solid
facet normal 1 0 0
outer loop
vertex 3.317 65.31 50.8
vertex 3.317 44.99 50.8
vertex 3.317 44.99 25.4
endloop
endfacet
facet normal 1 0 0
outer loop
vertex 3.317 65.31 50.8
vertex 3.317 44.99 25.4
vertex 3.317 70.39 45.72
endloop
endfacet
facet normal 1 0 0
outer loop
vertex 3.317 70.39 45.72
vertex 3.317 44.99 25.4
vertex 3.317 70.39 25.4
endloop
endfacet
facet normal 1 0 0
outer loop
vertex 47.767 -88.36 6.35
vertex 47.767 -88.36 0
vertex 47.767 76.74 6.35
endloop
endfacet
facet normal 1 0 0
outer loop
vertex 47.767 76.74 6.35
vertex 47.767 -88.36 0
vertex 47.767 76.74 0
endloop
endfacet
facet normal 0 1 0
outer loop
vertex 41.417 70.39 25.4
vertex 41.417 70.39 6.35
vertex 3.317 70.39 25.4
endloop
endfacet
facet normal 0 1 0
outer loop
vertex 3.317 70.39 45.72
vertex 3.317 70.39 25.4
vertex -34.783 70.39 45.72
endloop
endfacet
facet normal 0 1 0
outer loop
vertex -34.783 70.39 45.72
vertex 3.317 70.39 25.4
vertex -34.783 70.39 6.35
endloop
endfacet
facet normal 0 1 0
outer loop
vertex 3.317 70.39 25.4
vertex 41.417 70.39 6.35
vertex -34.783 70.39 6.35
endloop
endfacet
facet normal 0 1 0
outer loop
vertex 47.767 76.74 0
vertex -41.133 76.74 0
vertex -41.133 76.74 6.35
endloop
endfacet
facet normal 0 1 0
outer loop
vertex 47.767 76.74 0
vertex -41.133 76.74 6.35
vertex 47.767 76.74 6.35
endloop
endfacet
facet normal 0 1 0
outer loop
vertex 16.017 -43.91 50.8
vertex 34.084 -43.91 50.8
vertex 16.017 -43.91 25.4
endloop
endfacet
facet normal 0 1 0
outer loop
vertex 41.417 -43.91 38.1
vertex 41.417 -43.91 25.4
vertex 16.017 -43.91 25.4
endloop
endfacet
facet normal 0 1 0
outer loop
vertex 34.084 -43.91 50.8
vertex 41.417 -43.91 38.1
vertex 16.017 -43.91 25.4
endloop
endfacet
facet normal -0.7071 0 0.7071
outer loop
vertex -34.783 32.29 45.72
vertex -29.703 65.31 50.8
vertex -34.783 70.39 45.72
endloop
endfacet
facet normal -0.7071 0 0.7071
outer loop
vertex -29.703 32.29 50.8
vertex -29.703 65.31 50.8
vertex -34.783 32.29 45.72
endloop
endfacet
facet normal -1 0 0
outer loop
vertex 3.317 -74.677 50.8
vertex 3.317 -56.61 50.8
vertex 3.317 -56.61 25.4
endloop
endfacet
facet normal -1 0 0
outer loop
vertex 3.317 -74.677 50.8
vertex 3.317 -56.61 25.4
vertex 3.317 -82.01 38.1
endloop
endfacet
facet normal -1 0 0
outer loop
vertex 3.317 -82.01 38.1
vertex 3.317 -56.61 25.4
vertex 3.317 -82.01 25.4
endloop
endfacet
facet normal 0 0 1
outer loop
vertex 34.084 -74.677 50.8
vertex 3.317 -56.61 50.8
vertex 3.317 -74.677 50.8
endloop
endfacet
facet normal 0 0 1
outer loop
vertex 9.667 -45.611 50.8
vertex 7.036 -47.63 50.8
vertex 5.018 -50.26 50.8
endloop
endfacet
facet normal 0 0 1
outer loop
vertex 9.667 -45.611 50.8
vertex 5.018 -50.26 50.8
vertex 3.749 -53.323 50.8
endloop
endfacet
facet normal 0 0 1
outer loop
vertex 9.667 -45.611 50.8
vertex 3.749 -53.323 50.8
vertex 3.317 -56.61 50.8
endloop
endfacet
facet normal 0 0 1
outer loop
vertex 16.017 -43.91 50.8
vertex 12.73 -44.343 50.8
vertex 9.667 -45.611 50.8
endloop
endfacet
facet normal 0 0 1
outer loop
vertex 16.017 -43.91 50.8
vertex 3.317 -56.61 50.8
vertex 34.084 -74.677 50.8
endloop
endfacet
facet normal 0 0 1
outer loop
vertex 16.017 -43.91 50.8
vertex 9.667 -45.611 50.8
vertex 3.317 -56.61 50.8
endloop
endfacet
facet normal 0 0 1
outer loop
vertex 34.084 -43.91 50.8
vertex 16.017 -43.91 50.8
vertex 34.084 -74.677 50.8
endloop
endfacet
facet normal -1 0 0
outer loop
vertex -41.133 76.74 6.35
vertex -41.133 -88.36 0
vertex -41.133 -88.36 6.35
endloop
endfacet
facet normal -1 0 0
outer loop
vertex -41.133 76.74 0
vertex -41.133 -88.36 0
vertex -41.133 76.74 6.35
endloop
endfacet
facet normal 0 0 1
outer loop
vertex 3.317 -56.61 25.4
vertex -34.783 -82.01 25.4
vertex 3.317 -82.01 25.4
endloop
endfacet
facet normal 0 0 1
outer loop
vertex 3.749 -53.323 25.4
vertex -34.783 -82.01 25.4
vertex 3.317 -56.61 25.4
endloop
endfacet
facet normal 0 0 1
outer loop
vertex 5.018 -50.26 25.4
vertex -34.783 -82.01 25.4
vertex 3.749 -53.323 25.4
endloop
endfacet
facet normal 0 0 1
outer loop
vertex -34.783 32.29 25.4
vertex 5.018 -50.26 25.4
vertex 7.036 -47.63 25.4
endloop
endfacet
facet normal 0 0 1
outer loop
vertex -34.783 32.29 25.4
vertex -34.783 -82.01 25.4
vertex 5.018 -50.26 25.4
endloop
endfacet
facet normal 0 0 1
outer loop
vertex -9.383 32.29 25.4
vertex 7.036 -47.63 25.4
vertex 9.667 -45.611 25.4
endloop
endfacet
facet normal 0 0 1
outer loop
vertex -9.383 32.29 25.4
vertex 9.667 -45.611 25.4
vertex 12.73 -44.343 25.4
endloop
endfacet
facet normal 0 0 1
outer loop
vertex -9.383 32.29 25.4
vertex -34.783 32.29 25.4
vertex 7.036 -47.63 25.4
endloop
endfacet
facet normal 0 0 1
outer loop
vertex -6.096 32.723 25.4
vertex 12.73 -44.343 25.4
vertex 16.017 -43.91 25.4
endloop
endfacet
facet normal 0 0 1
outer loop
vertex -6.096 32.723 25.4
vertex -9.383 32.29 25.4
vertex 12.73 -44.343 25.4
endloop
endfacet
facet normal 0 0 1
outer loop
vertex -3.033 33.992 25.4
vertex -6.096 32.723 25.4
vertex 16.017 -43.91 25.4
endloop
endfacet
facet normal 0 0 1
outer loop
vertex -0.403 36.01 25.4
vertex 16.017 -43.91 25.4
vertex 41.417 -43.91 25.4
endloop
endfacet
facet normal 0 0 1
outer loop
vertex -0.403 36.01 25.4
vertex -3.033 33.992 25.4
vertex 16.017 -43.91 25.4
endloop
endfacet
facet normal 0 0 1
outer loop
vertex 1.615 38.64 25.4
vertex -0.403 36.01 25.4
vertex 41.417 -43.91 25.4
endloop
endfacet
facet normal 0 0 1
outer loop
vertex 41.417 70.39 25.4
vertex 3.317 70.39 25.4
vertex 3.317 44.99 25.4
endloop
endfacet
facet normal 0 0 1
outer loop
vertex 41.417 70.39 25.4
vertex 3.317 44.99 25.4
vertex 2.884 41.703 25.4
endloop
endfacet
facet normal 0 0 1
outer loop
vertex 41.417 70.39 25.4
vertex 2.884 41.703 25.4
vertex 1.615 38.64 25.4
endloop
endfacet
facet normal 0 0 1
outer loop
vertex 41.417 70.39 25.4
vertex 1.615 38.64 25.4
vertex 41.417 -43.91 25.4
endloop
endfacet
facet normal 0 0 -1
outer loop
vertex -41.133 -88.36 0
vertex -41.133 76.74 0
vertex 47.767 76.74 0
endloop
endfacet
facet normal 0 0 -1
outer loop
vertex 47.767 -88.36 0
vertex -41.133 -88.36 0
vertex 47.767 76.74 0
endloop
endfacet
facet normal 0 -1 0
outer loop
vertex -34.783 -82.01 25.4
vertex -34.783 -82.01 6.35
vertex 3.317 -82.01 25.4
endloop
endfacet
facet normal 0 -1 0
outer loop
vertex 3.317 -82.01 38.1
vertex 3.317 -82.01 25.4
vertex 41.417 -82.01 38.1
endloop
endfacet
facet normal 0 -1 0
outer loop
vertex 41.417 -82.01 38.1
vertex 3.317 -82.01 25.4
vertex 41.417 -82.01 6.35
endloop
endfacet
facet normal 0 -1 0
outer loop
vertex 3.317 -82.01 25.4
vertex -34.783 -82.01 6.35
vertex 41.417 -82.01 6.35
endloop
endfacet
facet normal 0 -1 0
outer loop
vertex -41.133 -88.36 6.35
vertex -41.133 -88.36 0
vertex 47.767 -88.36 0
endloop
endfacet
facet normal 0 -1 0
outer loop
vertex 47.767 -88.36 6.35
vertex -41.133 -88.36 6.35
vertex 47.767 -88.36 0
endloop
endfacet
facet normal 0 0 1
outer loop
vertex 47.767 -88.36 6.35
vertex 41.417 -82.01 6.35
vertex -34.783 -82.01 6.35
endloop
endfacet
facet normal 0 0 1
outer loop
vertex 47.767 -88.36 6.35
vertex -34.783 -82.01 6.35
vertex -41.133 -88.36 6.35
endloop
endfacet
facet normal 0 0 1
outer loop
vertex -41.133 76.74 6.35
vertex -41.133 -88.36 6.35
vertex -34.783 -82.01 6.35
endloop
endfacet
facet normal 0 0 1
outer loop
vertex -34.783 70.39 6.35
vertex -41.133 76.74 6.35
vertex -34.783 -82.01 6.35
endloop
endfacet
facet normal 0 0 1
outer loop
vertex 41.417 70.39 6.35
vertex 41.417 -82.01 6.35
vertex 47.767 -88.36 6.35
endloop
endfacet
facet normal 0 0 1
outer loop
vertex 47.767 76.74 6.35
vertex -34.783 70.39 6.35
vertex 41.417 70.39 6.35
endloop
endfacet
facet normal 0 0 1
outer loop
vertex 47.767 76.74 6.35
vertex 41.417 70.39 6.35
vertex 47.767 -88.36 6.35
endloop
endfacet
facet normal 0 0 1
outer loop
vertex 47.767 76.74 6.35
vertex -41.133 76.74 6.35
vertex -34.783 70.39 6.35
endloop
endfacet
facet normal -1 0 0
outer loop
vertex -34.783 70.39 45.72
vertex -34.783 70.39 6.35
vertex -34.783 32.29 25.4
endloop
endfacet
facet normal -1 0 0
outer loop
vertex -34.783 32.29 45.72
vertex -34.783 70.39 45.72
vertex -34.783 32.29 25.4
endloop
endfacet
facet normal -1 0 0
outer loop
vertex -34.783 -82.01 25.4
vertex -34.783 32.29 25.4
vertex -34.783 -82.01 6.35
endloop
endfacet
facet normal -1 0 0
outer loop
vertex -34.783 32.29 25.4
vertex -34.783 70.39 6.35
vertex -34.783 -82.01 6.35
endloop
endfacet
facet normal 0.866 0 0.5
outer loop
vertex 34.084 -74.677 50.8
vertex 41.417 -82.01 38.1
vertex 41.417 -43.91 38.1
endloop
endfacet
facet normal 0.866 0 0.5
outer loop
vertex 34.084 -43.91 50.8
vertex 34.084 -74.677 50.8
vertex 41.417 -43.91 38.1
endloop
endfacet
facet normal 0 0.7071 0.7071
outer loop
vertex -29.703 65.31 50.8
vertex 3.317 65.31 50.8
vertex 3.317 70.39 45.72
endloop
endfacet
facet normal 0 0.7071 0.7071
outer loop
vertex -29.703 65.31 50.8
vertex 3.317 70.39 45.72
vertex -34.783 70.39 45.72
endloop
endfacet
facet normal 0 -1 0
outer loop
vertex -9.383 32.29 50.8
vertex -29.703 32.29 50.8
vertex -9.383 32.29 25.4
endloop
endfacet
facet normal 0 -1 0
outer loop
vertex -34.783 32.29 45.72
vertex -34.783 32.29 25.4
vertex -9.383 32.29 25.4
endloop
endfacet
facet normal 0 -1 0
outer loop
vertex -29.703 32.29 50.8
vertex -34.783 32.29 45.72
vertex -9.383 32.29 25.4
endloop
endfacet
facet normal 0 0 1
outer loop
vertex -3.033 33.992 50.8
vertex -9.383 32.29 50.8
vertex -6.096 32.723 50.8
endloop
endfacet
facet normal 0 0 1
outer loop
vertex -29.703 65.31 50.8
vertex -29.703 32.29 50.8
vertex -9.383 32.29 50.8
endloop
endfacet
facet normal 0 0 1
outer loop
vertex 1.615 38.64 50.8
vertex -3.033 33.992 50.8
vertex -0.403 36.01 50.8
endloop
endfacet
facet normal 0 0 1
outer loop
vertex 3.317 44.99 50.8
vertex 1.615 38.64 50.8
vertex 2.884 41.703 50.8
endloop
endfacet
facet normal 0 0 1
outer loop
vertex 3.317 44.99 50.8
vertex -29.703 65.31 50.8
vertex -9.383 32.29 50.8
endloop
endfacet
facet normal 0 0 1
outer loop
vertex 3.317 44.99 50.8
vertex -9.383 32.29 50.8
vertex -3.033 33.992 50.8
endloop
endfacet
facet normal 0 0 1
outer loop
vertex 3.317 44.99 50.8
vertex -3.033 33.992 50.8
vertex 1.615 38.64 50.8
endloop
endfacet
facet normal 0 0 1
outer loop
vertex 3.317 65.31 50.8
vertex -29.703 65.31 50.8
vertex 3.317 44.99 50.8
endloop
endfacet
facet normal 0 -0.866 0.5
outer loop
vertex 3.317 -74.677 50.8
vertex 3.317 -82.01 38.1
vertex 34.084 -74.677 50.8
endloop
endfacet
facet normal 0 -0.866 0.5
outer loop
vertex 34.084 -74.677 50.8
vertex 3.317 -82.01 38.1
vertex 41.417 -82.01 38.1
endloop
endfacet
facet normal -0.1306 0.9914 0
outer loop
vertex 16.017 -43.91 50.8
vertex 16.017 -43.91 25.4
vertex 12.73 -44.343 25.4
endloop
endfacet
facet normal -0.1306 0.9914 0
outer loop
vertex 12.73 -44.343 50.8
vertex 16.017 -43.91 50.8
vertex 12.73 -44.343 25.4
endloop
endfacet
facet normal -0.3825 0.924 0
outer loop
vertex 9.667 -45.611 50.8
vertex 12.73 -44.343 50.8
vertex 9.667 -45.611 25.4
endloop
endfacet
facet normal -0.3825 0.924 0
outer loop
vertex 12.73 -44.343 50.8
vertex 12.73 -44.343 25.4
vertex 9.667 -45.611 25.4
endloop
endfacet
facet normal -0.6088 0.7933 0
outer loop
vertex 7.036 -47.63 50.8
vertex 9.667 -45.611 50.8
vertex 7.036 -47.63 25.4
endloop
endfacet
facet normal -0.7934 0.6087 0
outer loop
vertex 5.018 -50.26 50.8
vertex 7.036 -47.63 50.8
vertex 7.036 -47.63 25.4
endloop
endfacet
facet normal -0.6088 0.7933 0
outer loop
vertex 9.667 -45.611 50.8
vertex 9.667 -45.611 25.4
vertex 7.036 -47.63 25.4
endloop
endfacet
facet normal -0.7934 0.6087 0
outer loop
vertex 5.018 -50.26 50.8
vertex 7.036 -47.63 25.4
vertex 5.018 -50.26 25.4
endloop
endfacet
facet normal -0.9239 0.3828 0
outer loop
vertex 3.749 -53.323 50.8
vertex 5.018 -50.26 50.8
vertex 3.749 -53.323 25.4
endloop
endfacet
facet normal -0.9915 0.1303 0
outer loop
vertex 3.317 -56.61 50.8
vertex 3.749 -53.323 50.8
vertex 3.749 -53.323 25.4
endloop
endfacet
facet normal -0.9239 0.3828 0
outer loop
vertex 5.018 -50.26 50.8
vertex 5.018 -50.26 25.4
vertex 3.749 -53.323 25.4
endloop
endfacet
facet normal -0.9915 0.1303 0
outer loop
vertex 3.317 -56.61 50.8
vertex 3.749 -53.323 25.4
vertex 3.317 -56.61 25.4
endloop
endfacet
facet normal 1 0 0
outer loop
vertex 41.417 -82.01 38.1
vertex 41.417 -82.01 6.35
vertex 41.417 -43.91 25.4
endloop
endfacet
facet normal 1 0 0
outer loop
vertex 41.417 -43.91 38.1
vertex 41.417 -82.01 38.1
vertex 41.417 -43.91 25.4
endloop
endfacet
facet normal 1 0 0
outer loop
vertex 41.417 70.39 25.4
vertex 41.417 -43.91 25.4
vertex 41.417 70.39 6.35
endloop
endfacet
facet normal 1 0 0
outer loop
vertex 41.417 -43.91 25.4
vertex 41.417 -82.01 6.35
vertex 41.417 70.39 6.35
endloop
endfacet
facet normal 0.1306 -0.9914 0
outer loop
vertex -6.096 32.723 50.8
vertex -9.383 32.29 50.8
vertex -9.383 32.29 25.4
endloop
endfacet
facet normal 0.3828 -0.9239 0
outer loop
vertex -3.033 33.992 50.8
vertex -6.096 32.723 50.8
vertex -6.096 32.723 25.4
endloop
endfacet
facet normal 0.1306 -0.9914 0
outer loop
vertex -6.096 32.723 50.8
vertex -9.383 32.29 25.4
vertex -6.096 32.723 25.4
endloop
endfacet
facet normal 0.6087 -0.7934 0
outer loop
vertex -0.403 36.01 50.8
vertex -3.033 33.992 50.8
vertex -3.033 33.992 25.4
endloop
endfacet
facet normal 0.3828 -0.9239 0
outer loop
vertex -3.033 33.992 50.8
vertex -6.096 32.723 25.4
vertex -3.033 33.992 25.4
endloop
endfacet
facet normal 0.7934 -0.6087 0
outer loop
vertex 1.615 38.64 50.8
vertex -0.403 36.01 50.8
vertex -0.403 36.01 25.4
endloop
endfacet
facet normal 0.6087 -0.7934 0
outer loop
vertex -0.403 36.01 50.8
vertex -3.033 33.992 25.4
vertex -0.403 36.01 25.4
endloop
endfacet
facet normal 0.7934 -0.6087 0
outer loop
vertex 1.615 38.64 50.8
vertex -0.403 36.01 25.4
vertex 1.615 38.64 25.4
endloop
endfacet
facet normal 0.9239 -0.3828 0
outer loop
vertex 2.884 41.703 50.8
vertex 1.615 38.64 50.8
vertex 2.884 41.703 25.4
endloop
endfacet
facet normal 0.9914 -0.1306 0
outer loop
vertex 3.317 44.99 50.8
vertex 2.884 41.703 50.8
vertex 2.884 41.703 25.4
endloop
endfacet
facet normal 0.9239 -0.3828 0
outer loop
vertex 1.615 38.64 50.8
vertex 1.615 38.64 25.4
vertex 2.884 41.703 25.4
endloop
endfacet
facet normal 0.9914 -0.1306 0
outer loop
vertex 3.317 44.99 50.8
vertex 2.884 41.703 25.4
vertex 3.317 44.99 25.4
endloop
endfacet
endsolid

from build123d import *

# Parameters (mm, degrees)
F0_W     = 88.9
F0_H     = 165.1
F1_DEPTH = 6.35
F2_DEPTH = 25.4
F3_DEPTH = 50.8
F4_SIZE2 = 12.7
F4_SIZE  = 7.3323484187
F5_SIZE  = 5.08


with BuildPart() as f1:
    # F0 (on Top) → F1 (new body)
    with BuildSketch(Plane.XY):
        with Locations((3.3165217161, -5.8097798109)):
            Rectangle(F0_W, F0_H)
        Polygon((-34.7834782839, 32.2902201891), (-34.7834782839, 70.3902201891), (3.3165217161, 70.3902201891), (41.4165217161, 70.3902201891), (41.4165217161, -43.9097798109), (41.4165217161, -82.0097798109), (3.3165217161, -82.0097798109), (-34.7834782839, -82.0097798109), align=None, mode=Mode.SUBTRACT)
    extrude(amount=F1_DEPTH)

    # F0 (on Top) → F2 (join)
    with BuildSketch(Plane.XY):
        with BuildLine():
            Line((41.4165217161, 70.3902201891), (3.3165217161, 70.3902201891))
            Line((3.3165217161, 70.3902201891), (3.3165217161, 44.9902201891))
            ThreePointArc((3.3165217161, 44.9902201891), (-0.4032221628, 36.009964068), (-9.3834782839, 32.2902201891))
            Line((-9.3834782839, 32.2902201891), (-34.7834782839, 32.2902201891))
            Line((-34.7834782839, 32.2902201891), (-34.7834782839, -82.0097798109))
            Line((-34.7834782839, -82.0097798109), (3.3165217161, -82.0097798109))
            Line((3.3165217161, -82.0097798109), (3.3165217161, -56.6097798109))
            ThreePointArc((3.3165217161, -56.6097798109), (7.036265595, -47.6295236898), (16.0165217161, -43.9097798109))
            Line((16.0165217161, -43.9097798109), (41.4165217161, -43.9097798109))
            Line((41.4165217161, -43.9097798109), (41.4165217161, 70.3902201891))
        make_face()
    extrude(amount=F2_DEPTH)

    # F0 (on Top) → F3 (join)
    with BuildSketch(Plane.XY):
        with BuildLine():
            Line((3.3165217161, 70.3902201891), (-34.7834782839, 70.3902201891))
            Line((-34.7834782839, 70.3902201891), (-34.7834782839, 32.2902201891))
            Line((-34.7834782839, 32.2902201891), (-9.3834782839, 32.2902201891))
            ThreePointArc((-9.3834782839, 32.2902201891), (-0.4032221628, 36.009964068), (3.3165217161, 44.9902201891))
            Line((3.3165217161, 44.9902201891), (3.3165217161, 70.3902201891))
        make_face()
        with BuildLine():
            Line((41.4165217161, -82.0097798109), (41.4165217161, -43.9097798109))
            Line((41.4165217161, -43.9097798109), (16.0165217161, -43.9097798109))
            ThreePointArc((16.0165217161, -43.9097798109), (7.036265595, -47.6295236898), (3.3165217161, -56.6097798109))
            Line((3.3165217161, -56.6097798109), (3.3165217161, -82.0097798109))
            Line((3.3165217161, -82.0097798109), (41.4165217161, -82.0097798109))
        make_face()
    extrude(amount=F3_DEPTH)

    # F4
    f4_edges = [f1.edges().sort_by_distance(p)[0] for p in [
        (22.366522, -82.00978, 50.8),
        (41.416522, -62.95978, 50.8),
    ]]
    f4_side = f1.faces().sort_by_distance((22.762564, -63.355822, 50.8))[0]
    chamfer(f4_edges, length=F4_SIZE, length2=F4_SIZE2, reference=f4_side)

    # F5
    f5_edges = [f1.edges().sort_by_distance(p)[0] for p in [
        (-15.733478, 70.39022, 50.8),
        (-34.783478, 51.34022, 50.8),
    ]]
    chamfer(f5_edges, length=F5_SIZE)


solid = f1.part
